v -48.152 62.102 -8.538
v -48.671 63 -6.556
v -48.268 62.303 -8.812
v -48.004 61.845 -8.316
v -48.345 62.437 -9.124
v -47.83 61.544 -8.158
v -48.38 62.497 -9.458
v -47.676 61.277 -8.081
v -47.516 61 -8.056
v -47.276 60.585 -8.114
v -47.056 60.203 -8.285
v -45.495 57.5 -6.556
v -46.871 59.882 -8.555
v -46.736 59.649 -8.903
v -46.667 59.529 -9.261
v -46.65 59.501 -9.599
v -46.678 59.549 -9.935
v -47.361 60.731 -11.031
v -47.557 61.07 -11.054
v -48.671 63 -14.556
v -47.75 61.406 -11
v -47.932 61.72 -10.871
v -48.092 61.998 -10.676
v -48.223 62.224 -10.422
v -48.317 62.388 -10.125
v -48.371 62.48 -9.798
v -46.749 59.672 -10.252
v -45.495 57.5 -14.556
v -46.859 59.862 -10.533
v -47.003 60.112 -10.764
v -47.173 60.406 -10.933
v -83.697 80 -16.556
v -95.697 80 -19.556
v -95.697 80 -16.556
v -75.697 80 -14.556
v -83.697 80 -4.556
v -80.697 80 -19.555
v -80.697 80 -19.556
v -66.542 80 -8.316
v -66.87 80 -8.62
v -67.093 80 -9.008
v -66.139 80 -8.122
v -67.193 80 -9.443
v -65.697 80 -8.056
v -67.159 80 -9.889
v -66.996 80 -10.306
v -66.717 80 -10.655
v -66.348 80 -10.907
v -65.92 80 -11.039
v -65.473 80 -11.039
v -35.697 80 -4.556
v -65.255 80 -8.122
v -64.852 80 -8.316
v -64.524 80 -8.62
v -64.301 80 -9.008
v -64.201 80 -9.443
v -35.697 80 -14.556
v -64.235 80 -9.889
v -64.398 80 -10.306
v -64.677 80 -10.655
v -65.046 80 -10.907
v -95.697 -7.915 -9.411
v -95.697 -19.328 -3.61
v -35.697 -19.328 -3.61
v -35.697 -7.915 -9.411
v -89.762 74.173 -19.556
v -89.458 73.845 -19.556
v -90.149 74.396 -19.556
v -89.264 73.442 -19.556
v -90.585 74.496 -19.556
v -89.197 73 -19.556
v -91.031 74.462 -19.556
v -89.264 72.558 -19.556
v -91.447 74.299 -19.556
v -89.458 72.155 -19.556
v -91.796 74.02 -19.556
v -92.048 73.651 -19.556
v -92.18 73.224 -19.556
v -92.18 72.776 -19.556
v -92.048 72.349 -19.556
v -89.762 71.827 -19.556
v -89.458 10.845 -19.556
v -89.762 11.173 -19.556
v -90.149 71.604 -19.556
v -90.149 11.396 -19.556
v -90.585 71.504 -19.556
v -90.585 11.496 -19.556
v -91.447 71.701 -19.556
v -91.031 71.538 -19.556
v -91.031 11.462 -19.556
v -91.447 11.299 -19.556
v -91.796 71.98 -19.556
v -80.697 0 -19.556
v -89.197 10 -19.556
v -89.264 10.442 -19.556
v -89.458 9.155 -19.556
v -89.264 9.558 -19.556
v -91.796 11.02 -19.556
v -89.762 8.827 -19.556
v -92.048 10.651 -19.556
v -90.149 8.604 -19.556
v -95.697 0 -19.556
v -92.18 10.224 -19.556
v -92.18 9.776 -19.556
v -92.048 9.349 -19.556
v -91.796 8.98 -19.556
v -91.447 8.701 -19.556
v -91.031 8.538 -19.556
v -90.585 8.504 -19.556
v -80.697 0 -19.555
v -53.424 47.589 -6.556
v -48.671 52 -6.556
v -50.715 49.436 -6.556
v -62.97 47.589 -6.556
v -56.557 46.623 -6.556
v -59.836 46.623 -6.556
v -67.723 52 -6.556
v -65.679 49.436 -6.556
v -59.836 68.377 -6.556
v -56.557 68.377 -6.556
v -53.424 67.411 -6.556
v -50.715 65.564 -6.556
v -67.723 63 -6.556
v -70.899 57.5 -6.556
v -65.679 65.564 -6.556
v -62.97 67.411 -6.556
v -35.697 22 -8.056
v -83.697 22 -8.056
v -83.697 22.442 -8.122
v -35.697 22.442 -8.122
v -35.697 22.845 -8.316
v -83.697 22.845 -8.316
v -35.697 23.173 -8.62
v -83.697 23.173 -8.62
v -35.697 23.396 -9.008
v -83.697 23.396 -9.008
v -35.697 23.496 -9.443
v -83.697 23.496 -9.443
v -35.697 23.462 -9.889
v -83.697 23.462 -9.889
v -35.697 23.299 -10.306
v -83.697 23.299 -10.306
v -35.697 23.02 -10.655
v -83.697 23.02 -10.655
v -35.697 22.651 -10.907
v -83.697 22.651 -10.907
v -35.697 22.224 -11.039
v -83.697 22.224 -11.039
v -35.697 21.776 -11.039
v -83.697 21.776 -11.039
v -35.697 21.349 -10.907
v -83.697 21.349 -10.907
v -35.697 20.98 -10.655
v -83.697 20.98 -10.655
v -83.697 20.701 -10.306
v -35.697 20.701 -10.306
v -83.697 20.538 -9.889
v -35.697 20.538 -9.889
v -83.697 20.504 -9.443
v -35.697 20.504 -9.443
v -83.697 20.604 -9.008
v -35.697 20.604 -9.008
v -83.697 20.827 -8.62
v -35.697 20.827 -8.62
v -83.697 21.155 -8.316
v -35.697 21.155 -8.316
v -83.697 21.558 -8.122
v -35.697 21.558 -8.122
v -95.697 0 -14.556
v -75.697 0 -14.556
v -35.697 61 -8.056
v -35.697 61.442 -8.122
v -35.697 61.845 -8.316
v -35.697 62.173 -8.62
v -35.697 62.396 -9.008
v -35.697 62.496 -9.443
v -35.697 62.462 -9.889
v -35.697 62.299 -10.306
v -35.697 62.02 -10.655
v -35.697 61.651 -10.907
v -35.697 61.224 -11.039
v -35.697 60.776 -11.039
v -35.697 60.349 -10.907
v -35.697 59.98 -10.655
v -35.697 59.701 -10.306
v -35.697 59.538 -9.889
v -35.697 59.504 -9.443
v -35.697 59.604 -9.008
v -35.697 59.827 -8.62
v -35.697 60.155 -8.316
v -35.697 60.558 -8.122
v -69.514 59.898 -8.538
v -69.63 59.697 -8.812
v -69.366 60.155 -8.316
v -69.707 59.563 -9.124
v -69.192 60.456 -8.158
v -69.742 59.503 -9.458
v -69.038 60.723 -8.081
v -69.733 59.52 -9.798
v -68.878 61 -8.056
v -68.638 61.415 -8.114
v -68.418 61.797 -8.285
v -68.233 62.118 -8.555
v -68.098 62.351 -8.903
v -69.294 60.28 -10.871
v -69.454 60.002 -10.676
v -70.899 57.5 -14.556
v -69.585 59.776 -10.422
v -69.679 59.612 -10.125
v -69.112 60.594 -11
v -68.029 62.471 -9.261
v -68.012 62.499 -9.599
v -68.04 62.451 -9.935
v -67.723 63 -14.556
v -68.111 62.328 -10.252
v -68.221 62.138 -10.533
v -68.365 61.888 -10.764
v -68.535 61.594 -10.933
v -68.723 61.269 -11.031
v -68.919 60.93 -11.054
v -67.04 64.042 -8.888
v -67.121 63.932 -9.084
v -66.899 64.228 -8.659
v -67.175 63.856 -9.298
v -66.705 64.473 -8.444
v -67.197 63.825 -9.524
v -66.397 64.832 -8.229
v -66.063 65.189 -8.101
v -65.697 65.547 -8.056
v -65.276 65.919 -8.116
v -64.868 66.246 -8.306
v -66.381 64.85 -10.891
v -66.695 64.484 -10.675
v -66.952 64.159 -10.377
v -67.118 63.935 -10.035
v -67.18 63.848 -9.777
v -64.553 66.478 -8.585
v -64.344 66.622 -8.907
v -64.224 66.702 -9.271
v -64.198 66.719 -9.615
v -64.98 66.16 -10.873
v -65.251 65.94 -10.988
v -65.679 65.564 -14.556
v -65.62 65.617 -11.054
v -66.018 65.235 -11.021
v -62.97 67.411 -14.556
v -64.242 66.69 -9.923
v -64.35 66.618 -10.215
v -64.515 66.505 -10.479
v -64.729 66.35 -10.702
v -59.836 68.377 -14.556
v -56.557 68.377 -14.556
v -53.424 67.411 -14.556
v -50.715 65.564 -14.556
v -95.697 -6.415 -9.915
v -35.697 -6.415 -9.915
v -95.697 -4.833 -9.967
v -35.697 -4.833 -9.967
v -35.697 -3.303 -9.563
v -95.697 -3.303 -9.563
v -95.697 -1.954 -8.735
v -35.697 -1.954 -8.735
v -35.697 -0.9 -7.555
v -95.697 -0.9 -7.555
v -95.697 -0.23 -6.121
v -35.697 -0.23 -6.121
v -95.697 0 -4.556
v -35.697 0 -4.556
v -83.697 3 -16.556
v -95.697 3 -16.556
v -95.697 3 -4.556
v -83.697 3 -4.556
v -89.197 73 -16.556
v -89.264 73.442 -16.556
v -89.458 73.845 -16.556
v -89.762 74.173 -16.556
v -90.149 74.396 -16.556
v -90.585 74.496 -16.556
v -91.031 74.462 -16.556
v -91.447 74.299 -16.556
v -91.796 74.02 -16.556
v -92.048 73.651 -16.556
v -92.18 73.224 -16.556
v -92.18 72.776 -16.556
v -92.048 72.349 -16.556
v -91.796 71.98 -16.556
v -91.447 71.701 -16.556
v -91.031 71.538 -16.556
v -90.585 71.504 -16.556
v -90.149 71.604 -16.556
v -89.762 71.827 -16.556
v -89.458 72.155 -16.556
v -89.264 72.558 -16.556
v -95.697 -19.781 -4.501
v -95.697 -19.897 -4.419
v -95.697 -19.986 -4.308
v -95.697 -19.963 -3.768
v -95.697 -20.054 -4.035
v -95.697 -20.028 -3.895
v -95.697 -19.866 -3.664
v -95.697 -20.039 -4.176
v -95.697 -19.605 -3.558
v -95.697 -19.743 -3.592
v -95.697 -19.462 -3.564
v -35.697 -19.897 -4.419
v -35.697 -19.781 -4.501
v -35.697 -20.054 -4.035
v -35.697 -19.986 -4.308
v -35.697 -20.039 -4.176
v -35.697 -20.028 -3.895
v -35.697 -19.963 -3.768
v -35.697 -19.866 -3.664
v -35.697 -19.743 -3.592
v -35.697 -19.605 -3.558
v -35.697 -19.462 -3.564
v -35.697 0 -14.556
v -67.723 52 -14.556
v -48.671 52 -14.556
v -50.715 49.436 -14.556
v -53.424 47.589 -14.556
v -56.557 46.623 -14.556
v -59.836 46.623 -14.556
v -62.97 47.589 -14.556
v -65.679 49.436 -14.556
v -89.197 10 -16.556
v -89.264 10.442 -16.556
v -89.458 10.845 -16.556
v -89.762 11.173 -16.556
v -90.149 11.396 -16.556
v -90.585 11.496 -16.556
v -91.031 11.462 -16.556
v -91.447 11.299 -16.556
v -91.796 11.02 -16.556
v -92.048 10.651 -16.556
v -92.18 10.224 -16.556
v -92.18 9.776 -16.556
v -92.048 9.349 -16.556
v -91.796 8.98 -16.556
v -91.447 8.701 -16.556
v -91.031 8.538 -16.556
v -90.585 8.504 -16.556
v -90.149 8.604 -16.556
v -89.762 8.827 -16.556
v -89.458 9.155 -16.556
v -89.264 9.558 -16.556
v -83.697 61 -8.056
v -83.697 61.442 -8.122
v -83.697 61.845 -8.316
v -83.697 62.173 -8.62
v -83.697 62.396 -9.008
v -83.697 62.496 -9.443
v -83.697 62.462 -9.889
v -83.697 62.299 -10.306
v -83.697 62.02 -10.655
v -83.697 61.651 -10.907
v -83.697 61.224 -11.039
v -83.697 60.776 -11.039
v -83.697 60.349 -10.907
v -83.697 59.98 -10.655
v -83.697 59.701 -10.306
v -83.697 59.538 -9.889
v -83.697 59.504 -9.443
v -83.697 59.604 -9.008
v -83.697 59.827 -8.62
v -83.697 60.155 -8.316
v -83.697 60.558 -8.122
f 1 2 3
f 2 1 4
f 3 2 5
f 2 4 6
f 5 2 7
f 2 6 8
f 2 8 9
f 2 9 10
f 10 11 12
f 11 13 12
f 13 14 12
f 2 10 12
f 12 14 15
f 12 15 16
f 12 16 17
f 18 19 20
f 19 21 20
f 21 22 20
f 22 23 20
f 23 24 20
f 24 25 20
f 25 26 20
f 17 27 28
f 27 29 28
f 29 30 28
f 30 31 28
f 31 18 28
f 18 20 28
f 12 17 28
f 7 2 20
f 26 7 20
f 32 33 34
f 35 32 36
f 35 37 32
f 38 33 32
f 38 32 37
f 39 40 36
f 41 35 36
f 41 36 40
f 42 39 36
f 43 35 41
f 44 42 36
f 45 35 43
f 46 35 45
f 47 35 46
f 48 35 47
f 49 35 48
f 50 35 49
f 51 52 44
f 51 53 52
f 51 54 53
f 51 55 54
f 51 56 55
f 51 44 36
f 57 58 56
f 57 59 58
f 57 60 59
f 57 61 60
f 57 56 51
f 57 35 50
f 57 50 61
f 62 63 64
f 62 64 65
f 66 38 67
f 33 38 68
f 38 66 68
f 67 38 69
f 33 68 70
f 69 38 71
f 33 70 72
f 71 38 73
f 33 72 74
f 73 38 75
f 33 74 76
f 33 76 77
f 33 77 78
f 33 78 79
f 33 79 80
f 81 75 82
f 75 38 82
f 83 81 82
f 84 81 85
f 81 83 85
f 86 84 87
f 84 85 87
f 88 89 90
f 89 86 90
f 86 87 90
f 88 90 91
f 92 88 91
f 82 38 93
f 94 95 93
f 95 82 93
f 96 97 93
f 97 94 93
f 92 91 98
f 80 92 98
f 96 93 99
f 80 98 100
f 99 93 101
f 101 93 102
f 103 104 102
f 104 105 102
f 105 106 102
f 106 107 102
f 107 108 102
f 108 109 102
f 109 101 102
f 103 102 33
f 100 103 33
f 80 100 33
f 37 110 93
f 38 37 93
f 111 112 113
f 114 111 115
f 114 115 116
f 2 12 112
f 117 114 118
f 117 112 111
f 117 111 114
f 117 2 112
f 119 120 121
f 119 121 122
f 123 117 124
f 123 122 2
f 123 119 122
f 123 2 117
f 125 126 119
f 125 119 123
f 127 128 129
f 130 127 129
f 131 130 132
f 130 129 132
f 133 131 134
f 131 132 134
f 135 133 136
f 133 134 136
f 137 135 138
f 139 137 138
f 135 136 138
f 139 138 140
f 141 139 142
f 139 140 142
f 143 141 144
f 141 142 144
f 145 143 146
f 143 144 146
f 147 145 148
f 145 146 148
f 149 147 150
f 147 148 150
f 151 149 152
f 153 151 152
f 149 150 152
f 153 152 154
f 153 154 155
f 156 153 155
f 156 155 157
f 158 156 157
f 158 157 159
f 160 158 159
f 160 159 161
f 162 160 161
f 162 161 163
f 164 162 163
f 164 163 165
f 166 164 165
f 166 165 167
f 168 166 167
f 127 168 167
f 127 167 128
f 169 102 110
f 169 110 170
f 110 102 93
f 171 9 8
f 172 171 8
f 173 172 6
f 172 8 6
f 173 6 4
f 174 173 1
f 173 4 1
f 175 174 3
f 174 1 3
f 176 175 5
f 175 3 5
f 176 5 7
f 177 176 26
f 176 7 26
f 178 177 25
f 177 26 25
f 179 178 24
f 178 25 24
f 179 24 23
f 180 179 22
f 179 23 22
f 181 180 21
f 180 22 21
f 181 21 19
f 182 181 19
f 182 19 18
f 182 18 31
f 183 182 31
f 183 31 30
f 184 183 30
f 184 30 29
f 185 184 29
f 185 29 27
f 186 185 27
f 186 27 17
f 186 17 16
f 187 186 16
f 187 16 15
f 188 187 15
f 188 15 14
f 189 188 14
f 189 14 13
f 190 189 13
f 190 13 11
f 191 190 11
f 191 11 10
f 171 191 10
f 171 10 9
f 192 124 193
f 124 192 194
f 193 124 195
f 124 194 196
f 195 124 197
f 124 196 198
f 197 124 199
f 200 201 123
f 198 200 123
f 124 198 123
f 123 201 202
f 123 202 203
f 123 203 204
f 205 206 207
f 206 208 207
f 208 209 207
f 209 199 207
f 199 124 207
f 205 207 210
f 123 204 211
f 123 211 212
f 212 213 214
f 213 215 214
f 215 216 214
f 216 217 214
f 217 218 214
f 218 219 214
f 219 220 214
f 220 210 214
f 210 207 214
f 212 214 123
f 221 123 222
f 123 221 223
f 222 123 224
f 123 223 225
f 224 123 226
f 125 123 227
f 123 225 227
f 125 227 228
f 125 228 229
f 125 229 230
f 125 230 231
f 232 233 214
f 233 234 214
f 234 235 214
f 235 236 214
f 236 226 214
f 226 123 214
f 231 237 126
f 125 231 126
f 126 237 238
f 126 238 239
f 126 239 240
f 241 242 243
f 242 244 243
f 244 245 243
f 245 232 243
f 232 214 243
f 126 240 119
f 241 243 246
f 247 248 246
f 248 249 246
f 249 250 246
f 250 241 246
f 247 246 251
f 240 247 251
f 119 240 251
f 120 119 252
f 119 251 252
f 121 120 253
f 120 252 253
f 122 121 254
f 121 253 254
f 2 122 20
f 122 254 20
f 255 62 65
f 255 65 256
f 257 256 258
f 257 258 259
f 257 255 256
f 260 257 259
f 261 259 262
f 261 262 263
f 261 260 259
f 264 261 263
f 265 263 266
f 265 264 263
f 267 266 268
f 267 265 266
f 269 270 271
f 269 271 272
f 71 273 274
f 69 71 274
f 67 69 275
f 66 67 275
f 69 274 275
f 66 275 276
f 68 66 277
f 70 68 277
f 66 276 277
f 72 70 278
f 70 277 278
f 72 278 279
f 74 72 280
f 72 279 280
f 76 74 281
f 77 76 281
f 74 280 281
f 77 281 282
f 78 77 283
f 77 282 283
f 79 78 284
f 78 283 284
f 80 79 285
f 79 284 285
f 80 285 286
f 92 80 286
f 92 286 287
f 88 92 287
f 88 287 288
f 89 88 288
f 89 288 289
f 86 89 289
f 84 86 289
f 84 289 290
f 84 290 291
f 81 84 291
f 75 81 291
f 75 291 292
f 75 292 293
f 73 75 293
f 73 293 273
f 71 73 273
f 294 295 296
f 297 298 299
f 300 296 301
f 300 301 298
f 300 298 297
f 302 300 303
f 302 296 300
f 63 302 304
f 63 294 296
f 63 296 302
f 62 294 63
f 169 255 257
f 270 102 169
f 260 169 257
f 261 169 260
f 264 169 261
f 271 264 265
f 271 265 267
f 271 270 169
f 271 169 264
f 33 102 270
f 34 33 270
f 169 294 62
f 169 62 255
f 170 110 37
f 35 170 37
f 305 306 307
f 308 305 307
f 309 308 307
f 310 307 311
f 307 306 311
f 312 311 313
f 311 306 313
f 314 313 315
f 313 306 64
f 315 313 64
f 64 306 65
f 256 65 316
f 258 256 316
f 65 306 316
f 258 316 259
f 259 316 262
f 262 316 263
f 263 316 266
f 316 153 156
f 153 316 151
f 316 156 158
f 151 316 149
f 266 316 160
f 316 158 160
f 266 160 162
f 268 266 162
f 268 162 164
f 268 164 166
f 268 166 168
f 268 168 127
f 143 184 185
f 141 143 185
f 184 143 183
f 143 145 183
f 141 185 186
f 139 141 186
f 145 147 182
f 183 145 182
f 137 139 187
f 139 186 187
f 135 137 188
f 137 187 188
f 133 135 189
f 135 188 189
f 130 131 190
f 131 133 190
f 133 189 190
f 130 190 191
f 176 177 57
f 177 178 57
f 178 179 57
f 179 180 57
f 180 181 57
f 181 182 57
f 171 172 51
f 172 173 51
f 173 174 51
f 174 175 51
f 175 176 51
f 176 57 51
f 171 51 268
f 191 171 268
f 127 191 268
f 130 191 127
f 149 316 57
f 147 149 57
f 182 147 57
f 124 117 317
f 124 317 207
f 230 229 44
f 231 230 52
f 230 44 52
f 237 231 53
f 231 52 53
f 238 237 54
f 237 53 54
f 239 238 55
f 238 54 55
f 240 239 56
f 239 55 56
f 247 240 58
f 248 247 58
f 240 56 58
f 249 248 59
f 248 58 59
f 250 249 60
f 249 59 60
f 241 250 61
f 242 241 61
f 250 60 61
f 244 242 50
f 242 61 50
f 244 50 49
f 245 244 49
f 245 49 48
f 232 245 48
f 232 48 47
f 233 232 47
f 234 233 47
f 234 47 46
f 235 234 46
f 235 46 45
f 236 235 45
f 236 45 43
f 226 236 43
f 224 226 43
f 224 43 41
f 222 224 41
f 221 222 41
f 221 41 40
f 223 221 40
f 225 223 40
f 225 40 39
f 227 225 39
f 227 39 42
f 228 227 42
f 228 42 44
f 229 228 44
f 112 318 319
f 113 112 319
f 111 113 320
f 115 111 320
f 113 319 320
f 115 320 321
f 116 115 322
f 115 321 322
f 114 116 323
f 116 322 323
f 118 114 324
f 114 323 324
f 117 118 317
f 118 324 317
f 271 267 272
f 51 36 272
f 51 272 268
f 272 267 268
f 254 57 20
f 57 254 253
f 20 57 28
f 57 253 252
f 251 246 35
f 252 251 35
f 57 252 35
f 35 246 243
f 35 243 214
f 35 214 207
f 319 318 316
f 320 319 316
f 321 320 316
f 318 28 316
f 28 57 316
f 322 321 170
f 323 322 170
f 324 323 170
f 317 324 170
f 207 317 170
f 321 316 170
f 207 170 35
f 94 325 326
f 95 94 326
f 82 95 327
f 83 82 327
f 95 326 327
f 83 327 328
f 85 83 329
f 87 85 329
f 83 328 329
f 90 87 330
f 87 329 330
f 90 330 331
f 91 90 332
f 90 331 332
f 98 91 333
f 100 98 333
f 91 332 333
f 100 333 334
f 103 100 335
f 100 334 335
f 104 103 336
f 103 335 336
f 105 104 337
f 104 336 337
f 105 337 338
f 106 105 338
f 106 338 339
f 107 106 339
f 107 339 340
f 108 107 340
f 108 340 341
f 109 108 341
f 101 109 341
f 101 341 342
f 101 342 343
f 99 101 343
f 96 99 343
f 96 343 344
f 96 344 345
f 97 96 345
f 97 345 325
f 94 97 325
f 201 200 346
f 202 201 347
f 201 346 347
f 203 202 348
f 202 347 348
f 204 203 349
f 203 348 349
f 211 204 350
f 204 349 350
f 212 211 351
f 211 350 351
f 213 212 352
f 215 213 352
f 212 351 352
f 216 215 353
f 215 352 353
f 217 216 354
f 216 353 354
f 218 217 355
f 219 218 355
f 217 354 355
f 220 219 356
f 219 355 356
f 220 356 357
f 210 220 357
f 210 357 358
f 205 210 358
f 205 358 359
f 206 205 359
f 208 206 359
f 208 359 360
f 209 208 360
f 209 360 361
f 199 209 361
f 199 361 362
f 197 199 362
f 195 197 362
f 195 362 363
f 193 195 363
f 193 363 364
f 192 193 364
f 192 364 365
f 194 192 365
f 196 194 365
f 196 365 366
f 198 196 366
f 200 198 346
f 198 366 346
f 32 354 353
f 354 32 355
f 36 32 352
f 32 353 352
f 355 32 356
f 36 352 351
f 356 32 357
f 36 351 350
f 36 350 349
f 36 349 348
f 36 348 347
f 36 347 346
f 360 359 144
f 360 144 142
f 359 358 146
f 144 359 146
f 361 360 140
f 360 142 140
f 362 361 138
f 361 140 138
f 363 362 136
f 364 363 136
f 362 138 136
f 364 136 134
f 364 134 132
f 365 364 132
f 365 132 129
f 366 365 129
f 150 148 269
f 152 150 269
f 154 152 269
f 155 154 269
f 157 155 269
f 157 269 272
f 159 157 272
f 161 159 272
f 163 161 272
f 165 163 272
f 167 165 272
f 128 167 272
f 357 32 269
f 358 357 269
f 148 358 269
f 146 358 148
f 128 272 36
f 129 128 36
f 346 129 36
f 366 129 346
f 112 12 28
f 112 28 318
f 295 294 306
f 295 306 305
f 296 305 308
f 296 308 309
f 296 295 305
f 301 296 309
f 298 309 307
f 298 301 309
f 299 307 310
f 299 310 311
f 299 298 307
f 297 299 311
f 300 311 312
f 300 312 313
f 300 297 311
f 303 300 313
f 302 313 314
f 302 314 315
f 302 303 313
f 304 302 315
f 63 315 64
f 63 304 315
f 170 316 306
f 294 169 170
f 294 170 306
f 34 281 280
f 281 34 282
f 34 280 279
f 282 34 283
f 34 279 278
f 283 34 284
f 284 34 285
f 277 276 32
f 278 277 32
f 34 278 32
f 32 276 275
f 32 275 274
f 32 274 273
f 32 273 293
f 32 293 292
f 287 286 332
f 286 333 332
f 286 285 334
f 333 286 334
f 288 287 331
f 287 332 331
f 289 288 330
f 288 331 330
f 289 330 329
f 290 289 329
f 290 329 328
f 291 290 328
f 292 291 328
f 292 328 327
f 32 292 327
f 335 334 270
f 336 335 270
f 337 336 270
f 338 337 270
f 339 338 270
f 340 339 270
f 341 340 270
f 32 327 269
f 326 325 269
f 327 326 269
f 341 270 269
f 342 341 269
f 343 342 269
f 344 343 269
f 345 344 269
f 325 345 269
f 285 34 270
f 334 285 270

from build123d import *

# Parameters (mm, degrees)
BOSS_EXTRUDE1_DEPTH = 80
SKETCH2_3_W         = 12
SKETCH2_3_H         = 12
BOSS_EXTRUDE2_DEPTH = 3
SKETCH4_R           = 1.5
CUT_EXTRUDE1_DEPTH  = 96.322713731
SKETCH5_R           = 1.5
CUT_EXTRUDE2_DEPTH  = 126.307213604
CUT_EXTRUDE3_DEPTH  = 8
SKETCH7_R           = 1.5
CUT_EXTRUDE5_DEPTH  = 20
BOSS_EXTRUDE3_START = -60
BOSS_EXTRUDE3_DEPTH = 60
CHAMFER1_SIZE       = 5


with BuildPart() as part:
    # Sketch2 → Boss-Extrude1 (new body)
    with BuildSketch(Plane(origin=(0, 0, 0), x_dir=(1, 0, 0), z_dir=(0, 1, 0))):
        Polygon((-80.696905807, 19.555555556), (-95.696905807, 19.555555556), (-95.696905807, 16.555555556), (-83.696905807, 16.555555556), (-83.696905807, 4.555555556), (-35.696905807, 4.555555556), (-35.696905807, 14.555555556), (-80.696905807, 14.555555556), align=None)
    extrude(amount=BOSS_EXTRUDE1_DEPTH)

    # Sketch2<3> → Boss-Extrude2 (add)
    with BuildSketch(Plane(origin=(0, 0, 0), x_dir=(1, 0, 0), z_dir=(0, 1, 0))):
        with Locations((-89.696905807, 10.555555556)):
            Rectangle(SKETCH2_3_W, SKETCH2_3_H)
    extrude(amount=BOSS_EXTRUDE2_DEPTH)

    # Sketch4 → Cut-Extrude1 (cut, through all)
    with BuildSketch(Plane.ZY.offset(83.696905807)):
        with Locations((-9.555555556, 22)):
            Circle(SKETCH4_R)
        with Locations((-9.555555556, 61)):
            Circle(SKETCH4_R)
    extrude(amount=-CUT_EXTRUDE1_DEPTH, mode=Mode.SUBTRACT)

    # Sketch5 → Cut-Extrude2 (cut, through all)
    with BuildSketch(Plane.XY.offset(-16.555555556)):
        with Locations((-90.696905807, 10)):
            Circle(SKETCH5_R)
        with Locations((-90.696905807, 73)):
            Circle(SKETCH5_R)
    extrude(amount=-CUT_EXTRUDE2_DEPTH, mode=Mode.SUBTRACT)

    # Sketch6 → Cut-Extrude3 (cut)
    with BuildSketch(Plane(origin=(0, 0, -14.555555556), x_dir=(-1, 0, 0), z_dir=(0, 0, -1))):
        with BuildLine():
            Line((67.723185249, 52), (70.89861173, 57.5))
            Line((70.89861173, 57.5), (67.723185249, 63))
            ThreePointArc((67.723185249, 63), (58.196905807, 68.5), (48.670626366, 63))
            Line((48.670626366, 63), (45.495199885, 57.5))
            Line((45.495199885, 57.5), (48.670626366, 52))
            ThreePointArc((48.670626366, 52), (58.196905807, 46.5), (67.723185249, 52))
        make_face()
    extrude(amount=-CUT_EXTRUDE3_DEPTH, mode=Mode.SUBTRACT)

    # Sketch7 → Cut-Extrude5 (cut)
    with BuildSketch(Plane(origin=(0, 80, 0), x_dir=(1, 0, 0), z_dir=(0, 1, 0))):
        with Locations(Location((-65.696905807, 9.555555556, 0), (0, 0, 270))):
            Circle(SKETCH7_R)
    extrude(amount=-CUT_EXTRUDE5_DEPTH, mode=Mode.SUBTRACT)

    # Sketch8 → Boss-Extrude3 (add)
    with BuildSketch(Plane(origin=(-35.696905807, 0, 0), x_dir=(0, 0, -1), z_dir=(1, 0, 0)).offset(BOSS_EXTRUDE3_START)):
        with BuildLine():
            Line((14.555555556, 0), (4.501282487, -19.780828807))
            ThreePointArc((4.501282487, -19.780828807), (3.828999817, -20), (3.609828624, -19.32771733))
            Line((3.609828624, -19.32771733), (9.410961448, -7.914538626))
            ThreePointArc((9.410961448, -7.914538626), (9.198154182, -2.598476584), (4.555555556, 0))
            Line((4.555555556, 0), (14.555555556, 0))
        make_face()
    extrude(amount=BOSS_EXTRUDE3_DEPTH)

    # Chamfer1
    chamfer1_edges = [part.edges().sort_by_distance(p)[0] for p in [
        (-80.696905807, 40, -14.555555556),
    ]]
    chamfer(chamfer1_edges, length=CHAMFER1_SIZE - 0.0001)  # a hair under: the kernel refuses the full size


solid = part.part
